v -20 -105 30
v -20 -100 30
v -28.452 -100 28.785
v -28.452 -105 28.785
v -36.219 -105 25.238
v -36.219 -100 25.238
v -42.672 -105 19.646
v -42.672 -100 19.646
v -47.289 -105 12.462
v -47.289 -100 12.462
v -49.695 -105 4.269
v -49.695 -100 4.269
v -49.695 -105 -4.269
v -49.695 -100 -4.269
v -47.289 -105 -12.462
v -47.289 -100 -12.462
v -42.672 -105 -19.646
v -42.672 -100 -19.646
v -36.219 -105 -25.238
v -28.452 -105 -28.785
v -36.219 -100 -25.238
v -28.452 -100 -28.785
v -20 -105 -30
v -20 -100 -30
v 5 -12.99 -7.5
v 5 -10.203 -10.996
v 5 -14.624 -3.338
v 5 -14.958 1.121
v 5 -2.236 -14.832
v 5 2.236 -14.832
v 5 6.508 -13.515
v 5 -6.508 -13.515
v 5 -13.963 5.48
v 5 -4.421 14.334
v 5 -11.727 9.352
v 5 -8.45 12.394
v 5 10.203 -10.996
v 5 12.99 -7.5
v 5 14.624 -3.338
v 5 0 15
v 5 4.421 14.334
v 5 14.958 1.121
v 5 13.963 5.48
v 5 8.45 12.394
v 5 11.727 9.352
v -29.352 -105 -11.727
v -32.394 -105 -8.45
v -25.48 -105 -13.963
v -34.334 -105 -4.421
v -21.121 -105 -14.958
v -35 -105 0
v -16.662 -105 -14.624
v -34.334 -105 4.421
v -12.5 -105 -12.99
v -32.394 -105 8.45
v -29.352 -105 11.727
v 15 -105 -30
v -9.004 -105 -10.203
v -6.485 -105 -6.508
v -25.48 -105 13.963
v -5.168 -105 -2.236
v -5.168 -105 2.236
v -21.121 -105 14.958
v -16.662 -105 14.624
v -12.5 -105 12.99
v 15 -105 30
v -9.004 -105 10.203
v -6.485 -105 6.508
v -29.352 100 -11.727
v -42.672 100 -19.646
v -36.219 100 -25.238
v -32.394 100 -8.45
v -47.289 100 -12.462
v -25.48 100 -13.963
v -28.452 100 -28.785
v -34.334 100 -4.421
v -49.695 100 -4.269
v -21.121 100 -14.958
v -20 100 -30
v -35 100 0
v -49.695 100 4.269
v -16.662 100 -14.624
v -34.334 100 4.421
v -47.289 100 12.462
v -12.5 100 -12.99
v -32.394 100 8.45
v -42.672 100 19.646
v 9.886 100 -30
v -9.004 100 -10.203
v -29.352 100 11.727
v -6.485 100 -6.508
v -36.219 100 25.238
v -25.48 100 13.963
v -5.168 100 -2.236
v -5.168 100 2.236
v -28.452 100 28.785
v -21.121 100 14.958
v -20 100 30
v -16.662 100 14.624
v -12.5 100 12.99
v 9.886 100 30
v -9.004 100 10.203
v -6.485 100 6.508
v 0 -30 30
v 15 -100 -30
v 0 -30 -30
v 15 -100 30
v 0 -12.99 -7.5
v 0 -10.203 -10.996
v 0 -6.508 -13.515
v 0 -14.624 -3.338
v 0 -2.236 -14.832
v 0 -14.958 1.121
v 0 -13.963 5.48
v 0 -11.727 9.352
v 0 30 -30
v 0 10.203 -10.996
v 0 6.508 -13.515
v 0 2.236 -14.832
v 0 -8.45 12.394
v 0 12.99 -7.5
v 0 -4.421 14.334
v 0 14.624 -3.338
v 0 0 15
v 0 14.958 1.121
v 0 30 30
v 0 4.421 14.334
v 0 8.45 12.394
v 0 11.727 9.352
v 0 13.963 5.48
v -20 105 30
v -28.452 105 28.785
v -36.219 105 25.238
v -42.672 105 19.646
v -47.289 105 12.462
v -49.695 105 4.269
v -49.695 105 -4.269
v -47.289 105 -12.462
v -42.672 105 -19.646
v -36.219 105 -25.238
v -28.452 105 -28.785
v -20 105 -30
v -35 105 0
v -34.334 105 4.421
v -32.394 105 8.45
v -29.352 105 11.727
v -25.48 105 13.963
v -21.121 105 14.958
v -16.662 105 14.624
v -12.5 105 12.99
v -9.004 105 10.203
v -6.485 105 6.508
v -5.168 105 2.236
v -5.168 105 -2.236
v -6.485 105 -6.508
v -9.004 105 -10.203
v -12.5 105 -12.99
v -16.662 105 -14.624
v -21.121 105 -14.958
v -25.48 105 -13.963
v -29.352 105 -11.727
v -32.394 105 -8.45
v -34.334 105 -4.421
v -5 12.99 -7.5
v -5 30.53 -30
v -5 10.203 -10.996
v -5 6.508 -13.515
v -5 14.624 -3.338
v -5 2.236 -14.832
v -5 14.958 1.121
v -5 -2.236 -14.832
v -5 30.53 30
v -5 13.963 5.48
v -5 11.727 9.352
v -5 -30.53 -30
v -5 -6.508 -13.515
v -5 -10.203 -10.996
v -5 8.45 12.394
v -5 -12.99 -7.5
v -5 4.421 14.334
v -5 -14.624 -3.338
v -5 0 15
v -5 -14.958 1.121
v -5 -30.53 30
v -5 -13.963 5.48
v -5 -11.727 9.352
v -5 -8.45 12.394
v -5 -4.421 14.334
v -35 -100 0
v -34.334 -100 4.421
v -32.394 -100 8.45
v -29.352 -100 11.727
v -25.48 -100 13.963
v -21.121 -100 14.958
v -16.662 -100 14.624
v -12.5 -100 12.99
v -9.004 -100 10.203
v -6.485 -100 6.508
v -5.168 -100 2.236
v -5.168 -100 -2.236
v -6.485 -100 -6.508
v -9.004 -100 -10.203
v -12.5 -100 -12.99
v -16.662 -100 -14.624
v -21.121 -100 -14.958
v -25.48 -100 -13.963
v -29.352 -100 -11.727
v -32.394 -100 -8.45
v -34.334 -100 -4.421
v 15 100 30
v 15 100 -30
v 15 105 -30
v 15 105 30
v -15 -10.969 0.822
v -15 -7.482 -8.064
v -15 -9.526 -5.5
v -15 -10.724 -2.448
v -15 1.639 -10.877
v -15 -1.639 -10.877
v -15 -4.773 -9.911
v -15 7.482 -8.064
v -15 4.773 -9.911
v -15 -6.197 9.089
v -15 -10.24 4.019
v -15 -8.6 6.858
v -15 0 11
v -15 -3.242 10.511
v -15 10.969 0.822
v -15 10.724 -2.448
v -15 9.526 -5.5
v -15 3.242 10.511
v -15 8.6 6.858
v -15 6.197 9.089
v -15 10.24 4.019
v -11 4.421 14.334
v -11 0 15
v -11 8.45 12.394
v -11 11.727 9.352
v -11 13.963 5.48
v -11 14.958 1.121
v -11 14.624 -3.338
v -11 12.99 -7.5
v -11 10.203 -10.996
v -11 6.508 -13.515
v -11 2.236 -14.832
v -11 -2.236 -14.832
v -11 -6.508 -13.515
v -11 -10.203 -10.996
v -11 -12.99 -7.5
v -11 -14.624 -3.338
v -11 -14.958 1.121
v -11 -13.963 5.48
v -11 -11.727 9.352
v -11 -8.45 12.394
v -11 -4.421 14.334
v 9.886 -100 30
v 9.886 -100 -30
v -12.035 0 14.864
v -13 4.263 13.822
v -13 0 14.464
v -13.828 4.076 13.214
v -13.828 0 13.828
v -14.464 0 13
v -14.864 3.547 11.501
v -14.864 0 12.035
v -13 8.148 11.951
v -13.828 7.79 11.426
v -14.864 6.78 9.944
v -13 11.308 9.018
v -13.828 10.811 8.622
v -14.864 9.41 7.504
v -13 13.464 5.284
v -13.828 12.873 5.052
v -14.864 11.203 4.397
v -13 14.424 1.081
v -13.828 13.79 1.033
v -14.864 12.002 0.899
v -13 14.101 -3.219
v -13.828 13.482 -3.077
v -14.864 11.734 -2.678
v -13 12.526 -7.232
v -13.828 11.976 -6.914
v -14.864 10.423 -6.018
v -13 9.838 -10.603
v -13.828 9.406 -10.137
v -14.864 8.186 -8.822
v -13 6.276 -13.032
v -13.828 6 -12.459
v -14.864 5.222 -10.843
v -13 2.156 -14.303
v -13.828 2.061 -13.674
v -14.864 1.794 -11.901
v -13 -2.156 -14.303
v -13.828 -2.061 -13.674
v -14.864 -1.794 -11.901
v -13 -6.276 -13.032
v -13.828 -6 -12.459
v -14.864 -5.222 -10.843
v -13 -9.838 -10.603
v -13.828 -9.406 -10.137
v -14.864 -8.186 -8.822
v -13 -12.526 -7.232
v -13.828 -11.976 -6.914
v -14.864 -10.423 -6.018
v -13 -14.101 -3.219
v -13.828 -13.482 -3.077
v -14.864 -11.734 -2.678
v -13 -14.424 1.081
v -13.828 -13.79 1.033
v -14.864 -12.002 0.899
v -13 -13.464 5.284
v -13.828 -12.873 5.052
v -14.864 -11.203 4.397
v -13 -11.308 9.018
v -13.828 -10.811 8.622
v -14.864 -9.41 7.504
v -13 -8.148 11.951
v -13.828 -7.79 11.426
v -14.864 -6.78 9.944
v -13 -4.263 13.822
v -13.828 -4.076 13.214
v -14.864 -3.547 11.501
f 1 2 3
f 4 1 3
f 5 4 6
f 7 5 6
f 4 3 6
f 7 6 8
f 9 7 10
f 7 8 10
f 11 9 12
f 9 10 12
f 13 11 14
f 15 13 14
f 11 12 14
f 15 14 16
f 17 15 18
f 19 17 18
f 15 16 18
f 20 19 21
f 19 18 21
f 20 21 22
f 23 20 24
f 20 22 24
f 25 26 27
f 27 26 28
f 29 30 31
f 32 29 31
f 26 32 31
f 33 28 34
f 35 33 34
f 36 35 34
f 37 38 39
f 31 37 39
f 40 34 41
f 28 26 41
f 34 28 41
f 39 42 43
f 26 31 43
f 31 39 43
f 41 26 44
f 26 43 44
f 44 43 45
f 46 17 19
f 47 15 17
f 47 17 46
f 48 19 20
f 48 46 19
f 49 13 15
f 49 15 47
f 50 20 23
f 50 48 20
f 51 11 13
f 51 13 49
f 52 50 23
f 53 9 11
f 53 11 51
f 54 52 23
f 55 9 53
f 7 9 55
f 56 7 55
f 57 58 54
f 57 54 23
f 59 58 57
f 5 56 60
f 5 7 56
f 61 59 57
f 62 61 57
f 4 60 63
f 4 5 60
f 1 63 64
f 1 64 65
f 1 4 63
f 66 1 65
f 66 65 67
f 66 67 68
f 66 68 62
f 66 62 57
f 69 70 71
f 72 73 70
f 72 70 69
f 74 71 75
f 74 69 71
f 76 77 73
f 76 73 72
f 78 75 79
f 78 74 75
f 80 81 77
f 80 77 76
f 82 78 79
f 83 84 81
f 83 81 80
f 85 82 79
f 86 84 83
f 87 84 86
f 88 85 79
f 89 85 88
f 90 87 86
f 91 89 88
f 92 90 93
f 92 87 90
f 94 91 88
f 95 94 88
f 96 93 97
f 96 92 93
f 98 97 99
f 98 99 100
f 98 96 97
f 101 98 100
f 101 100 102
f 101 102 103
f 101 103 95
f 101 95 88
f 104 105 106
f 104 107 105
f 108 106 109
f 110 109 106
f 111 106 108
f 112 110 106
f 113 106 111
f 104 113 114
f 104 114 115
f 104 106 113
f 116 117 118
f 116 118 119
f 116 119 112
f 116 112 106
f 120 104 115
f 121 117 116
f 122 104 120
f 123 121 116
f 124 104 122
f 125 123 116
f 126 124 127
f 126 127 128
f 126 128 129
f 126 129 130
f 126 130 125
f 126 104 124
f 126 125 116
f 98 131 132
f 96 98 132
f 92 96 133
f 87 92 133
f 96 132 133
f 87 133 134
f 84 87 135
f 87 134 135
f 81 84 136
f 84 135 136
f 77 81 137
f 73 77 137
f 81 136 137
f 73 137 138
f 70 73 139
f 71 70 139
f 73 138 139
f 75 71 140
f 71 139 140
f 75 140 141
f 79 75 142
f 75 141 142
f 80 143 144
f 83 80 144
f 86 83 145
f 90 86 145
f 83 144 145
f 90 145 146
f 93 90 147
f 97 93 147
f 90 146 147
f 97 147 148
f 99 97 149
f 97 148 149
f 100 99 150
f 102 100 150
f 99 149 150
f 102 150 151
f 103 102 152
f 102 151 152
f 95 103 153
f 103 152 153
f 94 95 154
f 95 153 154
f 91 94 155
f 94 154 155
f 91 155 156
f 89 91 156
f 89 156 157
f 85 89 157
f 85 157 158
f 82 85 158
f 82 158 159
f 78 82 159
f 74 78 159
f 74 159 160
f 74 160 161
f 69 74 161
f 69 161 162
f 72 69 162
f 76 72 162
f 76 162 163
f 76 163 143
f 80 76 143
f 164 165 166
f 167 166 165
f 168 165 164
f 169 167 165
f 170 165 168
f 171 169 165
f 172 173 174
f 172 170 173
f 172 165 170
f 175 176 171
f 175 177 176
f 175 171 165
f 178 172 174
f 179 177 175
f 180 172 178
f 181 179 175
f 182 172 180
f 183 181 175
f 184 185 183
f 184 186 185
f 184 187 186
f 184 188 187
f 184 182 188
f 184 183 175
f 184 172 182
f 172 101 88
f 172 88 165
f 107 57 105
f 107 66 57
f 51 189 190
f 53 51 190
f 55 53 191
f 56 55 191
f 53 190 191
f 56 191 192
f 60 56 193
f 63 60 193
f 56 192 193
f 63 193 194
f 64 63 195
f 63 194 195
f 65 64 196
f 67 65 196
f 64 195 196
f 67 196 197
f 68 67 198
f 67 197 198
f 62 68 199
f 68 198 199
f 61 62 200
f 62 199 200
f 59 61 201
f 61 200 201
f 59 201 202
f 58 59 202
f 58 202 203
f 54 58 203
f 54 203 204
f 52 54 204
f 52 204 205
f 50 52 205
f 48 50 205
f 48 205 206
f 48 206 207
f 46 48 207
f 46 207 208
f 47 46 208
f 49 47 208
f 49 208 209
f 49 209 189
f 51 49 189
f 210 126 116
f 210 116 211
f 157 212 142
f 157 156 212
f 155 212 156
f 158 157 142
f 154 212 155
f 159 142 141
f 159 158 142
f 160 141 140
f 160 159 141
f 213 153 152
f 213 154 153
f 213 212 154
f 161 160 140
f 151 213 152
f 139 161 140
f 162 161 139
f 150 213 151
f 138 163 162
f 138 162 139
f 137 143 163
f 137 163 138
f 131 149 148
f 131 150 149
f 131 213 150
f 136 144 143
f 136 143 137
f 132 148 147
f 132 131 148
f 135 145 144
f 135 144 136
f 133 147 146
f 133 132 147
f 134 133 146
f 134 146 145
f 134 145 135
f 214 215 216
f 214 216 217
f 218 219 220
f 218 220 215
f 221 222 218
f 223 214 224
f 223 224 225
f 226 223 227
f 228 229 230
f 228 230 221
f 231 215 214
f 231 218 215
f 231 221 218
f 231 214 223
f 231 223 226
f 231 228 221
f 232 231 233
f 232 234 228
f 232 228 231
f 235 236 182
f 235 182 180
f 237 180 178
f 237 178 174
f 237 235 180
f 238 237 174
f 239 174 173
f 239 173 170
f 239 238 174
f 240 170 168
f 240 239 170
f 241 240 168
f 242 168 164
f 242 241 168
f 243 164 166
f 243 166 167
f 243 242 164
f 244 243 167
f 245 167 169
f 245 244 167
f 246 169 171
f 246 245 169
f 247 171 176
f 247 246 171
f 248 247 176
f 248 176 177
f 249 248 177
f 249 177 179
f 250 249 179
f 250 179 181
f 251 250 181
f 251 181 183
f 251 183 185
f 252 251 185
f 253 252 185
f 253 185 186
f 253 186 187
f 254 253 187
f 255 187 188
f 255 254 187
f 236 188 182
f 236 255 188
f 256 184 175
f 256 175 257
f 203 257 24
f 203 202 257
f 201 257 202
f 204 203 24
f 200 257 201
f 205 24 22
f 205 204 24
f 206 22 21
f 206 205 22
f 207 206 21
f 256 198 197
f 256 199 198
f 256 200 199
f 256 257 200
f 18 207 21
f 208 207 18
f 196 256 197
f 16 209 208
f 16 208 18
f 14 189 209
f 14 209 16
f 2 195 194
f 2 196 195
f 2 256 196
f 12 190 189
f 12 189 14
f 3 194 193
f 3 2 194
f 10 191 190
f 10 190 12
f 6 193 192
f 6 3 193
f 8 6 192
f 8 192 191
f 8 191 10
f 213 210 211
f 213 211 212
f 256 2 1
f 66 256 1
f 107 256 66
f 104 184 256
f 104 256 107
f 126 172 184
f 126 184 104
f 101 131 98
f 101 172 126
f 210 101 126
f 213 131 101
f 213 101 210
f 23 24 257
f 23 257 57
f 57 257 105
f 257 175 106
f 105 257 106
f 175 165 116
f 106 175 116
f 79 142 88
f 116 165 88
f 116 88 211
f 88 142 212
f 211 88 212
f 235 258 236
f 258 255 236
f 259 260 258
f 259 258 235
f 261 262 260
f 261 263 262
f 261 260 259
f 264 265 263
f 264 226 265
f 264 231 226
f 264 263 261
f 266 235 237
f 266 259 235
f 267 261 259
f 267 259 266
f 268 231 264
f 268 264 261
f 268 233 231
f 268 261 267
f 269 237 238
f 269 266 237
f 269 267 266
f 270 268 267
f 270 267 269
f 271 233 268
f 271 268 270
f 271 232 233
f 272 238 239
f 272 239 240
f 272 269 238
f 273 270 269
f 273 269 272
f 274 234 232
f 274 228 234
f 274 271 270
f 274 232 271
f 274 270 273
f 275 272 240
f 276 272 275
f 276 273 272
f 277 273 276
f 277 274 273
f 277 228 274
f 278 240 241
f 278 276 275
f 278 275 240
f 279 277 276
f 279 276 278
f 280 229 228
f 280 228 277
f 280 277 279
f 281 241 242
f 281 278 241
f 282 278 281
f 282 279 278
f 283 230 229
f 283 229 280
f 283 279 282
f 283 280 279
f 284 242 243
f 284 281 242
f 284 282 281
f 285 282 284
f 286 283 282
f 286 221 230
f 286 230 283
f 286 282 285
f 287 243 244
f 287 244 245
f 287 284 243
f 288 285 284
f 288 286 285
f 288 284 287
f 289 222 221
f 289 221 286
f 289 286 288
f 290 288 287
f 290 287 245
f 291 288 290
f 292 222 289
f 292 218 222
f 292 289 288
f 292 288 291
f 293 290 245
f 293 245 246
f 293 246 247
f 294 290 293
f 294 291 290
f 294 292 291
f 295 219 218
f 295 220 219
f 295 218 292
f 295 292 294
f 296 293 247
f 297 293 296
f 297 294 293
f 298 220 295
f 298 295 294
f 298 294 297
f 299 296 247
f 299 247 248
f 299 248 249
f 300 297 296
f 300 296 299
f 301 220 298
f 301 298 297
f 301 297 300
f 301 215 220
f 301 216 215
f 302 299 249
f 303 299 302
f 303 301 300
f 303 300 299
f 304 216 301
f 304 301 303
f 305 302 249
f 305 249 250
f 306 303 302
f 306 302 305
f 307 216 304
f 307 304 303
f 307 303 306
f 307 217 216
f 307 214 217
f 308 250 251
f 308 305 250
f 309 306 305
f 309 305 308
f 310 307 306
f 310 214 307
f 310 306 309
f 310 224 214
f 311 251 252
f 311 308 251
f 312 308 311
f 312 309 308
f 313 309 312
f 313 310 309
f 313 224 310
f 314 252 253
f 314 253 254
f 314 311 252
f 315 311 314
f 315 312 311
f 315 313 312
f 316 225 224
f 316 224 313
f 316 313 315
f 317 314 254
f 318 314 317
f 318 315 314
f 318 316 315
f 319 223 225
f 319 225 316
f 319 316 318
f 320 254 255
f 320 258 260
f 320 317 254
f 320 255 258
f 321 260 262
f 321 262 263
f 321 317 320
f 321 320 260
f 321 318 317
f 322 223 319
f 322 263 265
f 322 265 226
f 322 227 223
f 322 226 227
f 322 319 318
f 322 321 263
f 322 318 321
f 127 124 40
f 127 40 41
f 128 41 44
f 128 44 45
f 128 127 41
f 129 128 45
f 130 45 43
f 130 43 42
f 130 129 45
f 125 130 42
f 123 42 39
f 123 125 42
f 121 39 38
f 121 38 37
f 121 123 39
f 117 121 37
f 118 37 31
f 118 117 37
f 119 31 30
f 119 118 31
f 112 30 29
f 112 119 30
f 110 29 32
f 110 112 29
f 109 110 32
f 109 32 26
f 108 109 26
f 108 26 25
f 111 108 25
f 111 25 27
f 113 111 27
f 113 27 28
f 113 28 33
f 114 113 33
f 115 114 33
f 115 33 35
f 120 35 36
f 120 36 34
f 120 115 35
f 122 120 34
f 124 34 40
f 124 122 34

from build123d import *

# Parameters (mm, degrees)
EXTRUDE_2_DEPTH     = 30
SKETCH_4_R          = 15
CUT_EXTRUDE_1_DEPTH = 210
SKETCH_5_R          = 15
EXTRUDE_3_DEPTH     = 10
FILLET_1_R          = 4


with BuildPart() as part:
    # 스케치3 → 보스-돌출2 (new, symmetric)
    with BuildSketch(Plane.XY):
        Polygon((0, -30), (0, 30), (15, 100), (15, 105), (-50, 105), (-50, 100), (9.886492477, 100), (-5, 30.529701772), (-5, -30.529701772), (9.886492477, -100), (-50, -100), (-50, -105), (15, -105), (15, -100), align=None)
    extrude(amount=EXTRUDE_2_DEPTH, both=True)

    # 스케치4 → 컷-돌출1 (cut)
    with BuildSketch(Plane(origin=(0, 105, 0), x_dir=(1, 0, 0), z_dir=(0, 1, 0))):
        with Locations(Location((-20, 0, 0), (0, 0, 180))):
            Circle(SKETCH_4_R)
        with BuildLine():
            Line((-20, 30), (-20, 33.122933613))
            Line((-20, 33.122933613), (-53.393516075, 33.122933613))
            Line((-53.393516075, 33.122933613), (-53.393516075, -32.957525704))
            Line((-53.393516075, -32.957525704), (-20, -32.957525704))
            Line((-20, -32.957525704), (-20, -30))
            ThreePointArc((-20, -30), (-50, 0), (-20, 30))
        make_face()
    extrude(amount=-CUT_EXTRUDE_1_DEPTH, mode=Mode.SUBTRACT)

    # 스케치5 → 보스-돌출3 (add, symmetric)
    with BuildSketch(Plane.ZY.offset(5)):
        Circle(SKETCH_5_R)
    extrude(amount=EXTRUDE_3_DEPTH, both=True)

    # 필렛1
    fillet_1_edges = [part.edges().sort_by_distance(p)[0] for p in [
        (-15, 0, -15),
    ]]
    fillet(fillet_1_edges, radius=FILLET_1_R)


solid = part.part
